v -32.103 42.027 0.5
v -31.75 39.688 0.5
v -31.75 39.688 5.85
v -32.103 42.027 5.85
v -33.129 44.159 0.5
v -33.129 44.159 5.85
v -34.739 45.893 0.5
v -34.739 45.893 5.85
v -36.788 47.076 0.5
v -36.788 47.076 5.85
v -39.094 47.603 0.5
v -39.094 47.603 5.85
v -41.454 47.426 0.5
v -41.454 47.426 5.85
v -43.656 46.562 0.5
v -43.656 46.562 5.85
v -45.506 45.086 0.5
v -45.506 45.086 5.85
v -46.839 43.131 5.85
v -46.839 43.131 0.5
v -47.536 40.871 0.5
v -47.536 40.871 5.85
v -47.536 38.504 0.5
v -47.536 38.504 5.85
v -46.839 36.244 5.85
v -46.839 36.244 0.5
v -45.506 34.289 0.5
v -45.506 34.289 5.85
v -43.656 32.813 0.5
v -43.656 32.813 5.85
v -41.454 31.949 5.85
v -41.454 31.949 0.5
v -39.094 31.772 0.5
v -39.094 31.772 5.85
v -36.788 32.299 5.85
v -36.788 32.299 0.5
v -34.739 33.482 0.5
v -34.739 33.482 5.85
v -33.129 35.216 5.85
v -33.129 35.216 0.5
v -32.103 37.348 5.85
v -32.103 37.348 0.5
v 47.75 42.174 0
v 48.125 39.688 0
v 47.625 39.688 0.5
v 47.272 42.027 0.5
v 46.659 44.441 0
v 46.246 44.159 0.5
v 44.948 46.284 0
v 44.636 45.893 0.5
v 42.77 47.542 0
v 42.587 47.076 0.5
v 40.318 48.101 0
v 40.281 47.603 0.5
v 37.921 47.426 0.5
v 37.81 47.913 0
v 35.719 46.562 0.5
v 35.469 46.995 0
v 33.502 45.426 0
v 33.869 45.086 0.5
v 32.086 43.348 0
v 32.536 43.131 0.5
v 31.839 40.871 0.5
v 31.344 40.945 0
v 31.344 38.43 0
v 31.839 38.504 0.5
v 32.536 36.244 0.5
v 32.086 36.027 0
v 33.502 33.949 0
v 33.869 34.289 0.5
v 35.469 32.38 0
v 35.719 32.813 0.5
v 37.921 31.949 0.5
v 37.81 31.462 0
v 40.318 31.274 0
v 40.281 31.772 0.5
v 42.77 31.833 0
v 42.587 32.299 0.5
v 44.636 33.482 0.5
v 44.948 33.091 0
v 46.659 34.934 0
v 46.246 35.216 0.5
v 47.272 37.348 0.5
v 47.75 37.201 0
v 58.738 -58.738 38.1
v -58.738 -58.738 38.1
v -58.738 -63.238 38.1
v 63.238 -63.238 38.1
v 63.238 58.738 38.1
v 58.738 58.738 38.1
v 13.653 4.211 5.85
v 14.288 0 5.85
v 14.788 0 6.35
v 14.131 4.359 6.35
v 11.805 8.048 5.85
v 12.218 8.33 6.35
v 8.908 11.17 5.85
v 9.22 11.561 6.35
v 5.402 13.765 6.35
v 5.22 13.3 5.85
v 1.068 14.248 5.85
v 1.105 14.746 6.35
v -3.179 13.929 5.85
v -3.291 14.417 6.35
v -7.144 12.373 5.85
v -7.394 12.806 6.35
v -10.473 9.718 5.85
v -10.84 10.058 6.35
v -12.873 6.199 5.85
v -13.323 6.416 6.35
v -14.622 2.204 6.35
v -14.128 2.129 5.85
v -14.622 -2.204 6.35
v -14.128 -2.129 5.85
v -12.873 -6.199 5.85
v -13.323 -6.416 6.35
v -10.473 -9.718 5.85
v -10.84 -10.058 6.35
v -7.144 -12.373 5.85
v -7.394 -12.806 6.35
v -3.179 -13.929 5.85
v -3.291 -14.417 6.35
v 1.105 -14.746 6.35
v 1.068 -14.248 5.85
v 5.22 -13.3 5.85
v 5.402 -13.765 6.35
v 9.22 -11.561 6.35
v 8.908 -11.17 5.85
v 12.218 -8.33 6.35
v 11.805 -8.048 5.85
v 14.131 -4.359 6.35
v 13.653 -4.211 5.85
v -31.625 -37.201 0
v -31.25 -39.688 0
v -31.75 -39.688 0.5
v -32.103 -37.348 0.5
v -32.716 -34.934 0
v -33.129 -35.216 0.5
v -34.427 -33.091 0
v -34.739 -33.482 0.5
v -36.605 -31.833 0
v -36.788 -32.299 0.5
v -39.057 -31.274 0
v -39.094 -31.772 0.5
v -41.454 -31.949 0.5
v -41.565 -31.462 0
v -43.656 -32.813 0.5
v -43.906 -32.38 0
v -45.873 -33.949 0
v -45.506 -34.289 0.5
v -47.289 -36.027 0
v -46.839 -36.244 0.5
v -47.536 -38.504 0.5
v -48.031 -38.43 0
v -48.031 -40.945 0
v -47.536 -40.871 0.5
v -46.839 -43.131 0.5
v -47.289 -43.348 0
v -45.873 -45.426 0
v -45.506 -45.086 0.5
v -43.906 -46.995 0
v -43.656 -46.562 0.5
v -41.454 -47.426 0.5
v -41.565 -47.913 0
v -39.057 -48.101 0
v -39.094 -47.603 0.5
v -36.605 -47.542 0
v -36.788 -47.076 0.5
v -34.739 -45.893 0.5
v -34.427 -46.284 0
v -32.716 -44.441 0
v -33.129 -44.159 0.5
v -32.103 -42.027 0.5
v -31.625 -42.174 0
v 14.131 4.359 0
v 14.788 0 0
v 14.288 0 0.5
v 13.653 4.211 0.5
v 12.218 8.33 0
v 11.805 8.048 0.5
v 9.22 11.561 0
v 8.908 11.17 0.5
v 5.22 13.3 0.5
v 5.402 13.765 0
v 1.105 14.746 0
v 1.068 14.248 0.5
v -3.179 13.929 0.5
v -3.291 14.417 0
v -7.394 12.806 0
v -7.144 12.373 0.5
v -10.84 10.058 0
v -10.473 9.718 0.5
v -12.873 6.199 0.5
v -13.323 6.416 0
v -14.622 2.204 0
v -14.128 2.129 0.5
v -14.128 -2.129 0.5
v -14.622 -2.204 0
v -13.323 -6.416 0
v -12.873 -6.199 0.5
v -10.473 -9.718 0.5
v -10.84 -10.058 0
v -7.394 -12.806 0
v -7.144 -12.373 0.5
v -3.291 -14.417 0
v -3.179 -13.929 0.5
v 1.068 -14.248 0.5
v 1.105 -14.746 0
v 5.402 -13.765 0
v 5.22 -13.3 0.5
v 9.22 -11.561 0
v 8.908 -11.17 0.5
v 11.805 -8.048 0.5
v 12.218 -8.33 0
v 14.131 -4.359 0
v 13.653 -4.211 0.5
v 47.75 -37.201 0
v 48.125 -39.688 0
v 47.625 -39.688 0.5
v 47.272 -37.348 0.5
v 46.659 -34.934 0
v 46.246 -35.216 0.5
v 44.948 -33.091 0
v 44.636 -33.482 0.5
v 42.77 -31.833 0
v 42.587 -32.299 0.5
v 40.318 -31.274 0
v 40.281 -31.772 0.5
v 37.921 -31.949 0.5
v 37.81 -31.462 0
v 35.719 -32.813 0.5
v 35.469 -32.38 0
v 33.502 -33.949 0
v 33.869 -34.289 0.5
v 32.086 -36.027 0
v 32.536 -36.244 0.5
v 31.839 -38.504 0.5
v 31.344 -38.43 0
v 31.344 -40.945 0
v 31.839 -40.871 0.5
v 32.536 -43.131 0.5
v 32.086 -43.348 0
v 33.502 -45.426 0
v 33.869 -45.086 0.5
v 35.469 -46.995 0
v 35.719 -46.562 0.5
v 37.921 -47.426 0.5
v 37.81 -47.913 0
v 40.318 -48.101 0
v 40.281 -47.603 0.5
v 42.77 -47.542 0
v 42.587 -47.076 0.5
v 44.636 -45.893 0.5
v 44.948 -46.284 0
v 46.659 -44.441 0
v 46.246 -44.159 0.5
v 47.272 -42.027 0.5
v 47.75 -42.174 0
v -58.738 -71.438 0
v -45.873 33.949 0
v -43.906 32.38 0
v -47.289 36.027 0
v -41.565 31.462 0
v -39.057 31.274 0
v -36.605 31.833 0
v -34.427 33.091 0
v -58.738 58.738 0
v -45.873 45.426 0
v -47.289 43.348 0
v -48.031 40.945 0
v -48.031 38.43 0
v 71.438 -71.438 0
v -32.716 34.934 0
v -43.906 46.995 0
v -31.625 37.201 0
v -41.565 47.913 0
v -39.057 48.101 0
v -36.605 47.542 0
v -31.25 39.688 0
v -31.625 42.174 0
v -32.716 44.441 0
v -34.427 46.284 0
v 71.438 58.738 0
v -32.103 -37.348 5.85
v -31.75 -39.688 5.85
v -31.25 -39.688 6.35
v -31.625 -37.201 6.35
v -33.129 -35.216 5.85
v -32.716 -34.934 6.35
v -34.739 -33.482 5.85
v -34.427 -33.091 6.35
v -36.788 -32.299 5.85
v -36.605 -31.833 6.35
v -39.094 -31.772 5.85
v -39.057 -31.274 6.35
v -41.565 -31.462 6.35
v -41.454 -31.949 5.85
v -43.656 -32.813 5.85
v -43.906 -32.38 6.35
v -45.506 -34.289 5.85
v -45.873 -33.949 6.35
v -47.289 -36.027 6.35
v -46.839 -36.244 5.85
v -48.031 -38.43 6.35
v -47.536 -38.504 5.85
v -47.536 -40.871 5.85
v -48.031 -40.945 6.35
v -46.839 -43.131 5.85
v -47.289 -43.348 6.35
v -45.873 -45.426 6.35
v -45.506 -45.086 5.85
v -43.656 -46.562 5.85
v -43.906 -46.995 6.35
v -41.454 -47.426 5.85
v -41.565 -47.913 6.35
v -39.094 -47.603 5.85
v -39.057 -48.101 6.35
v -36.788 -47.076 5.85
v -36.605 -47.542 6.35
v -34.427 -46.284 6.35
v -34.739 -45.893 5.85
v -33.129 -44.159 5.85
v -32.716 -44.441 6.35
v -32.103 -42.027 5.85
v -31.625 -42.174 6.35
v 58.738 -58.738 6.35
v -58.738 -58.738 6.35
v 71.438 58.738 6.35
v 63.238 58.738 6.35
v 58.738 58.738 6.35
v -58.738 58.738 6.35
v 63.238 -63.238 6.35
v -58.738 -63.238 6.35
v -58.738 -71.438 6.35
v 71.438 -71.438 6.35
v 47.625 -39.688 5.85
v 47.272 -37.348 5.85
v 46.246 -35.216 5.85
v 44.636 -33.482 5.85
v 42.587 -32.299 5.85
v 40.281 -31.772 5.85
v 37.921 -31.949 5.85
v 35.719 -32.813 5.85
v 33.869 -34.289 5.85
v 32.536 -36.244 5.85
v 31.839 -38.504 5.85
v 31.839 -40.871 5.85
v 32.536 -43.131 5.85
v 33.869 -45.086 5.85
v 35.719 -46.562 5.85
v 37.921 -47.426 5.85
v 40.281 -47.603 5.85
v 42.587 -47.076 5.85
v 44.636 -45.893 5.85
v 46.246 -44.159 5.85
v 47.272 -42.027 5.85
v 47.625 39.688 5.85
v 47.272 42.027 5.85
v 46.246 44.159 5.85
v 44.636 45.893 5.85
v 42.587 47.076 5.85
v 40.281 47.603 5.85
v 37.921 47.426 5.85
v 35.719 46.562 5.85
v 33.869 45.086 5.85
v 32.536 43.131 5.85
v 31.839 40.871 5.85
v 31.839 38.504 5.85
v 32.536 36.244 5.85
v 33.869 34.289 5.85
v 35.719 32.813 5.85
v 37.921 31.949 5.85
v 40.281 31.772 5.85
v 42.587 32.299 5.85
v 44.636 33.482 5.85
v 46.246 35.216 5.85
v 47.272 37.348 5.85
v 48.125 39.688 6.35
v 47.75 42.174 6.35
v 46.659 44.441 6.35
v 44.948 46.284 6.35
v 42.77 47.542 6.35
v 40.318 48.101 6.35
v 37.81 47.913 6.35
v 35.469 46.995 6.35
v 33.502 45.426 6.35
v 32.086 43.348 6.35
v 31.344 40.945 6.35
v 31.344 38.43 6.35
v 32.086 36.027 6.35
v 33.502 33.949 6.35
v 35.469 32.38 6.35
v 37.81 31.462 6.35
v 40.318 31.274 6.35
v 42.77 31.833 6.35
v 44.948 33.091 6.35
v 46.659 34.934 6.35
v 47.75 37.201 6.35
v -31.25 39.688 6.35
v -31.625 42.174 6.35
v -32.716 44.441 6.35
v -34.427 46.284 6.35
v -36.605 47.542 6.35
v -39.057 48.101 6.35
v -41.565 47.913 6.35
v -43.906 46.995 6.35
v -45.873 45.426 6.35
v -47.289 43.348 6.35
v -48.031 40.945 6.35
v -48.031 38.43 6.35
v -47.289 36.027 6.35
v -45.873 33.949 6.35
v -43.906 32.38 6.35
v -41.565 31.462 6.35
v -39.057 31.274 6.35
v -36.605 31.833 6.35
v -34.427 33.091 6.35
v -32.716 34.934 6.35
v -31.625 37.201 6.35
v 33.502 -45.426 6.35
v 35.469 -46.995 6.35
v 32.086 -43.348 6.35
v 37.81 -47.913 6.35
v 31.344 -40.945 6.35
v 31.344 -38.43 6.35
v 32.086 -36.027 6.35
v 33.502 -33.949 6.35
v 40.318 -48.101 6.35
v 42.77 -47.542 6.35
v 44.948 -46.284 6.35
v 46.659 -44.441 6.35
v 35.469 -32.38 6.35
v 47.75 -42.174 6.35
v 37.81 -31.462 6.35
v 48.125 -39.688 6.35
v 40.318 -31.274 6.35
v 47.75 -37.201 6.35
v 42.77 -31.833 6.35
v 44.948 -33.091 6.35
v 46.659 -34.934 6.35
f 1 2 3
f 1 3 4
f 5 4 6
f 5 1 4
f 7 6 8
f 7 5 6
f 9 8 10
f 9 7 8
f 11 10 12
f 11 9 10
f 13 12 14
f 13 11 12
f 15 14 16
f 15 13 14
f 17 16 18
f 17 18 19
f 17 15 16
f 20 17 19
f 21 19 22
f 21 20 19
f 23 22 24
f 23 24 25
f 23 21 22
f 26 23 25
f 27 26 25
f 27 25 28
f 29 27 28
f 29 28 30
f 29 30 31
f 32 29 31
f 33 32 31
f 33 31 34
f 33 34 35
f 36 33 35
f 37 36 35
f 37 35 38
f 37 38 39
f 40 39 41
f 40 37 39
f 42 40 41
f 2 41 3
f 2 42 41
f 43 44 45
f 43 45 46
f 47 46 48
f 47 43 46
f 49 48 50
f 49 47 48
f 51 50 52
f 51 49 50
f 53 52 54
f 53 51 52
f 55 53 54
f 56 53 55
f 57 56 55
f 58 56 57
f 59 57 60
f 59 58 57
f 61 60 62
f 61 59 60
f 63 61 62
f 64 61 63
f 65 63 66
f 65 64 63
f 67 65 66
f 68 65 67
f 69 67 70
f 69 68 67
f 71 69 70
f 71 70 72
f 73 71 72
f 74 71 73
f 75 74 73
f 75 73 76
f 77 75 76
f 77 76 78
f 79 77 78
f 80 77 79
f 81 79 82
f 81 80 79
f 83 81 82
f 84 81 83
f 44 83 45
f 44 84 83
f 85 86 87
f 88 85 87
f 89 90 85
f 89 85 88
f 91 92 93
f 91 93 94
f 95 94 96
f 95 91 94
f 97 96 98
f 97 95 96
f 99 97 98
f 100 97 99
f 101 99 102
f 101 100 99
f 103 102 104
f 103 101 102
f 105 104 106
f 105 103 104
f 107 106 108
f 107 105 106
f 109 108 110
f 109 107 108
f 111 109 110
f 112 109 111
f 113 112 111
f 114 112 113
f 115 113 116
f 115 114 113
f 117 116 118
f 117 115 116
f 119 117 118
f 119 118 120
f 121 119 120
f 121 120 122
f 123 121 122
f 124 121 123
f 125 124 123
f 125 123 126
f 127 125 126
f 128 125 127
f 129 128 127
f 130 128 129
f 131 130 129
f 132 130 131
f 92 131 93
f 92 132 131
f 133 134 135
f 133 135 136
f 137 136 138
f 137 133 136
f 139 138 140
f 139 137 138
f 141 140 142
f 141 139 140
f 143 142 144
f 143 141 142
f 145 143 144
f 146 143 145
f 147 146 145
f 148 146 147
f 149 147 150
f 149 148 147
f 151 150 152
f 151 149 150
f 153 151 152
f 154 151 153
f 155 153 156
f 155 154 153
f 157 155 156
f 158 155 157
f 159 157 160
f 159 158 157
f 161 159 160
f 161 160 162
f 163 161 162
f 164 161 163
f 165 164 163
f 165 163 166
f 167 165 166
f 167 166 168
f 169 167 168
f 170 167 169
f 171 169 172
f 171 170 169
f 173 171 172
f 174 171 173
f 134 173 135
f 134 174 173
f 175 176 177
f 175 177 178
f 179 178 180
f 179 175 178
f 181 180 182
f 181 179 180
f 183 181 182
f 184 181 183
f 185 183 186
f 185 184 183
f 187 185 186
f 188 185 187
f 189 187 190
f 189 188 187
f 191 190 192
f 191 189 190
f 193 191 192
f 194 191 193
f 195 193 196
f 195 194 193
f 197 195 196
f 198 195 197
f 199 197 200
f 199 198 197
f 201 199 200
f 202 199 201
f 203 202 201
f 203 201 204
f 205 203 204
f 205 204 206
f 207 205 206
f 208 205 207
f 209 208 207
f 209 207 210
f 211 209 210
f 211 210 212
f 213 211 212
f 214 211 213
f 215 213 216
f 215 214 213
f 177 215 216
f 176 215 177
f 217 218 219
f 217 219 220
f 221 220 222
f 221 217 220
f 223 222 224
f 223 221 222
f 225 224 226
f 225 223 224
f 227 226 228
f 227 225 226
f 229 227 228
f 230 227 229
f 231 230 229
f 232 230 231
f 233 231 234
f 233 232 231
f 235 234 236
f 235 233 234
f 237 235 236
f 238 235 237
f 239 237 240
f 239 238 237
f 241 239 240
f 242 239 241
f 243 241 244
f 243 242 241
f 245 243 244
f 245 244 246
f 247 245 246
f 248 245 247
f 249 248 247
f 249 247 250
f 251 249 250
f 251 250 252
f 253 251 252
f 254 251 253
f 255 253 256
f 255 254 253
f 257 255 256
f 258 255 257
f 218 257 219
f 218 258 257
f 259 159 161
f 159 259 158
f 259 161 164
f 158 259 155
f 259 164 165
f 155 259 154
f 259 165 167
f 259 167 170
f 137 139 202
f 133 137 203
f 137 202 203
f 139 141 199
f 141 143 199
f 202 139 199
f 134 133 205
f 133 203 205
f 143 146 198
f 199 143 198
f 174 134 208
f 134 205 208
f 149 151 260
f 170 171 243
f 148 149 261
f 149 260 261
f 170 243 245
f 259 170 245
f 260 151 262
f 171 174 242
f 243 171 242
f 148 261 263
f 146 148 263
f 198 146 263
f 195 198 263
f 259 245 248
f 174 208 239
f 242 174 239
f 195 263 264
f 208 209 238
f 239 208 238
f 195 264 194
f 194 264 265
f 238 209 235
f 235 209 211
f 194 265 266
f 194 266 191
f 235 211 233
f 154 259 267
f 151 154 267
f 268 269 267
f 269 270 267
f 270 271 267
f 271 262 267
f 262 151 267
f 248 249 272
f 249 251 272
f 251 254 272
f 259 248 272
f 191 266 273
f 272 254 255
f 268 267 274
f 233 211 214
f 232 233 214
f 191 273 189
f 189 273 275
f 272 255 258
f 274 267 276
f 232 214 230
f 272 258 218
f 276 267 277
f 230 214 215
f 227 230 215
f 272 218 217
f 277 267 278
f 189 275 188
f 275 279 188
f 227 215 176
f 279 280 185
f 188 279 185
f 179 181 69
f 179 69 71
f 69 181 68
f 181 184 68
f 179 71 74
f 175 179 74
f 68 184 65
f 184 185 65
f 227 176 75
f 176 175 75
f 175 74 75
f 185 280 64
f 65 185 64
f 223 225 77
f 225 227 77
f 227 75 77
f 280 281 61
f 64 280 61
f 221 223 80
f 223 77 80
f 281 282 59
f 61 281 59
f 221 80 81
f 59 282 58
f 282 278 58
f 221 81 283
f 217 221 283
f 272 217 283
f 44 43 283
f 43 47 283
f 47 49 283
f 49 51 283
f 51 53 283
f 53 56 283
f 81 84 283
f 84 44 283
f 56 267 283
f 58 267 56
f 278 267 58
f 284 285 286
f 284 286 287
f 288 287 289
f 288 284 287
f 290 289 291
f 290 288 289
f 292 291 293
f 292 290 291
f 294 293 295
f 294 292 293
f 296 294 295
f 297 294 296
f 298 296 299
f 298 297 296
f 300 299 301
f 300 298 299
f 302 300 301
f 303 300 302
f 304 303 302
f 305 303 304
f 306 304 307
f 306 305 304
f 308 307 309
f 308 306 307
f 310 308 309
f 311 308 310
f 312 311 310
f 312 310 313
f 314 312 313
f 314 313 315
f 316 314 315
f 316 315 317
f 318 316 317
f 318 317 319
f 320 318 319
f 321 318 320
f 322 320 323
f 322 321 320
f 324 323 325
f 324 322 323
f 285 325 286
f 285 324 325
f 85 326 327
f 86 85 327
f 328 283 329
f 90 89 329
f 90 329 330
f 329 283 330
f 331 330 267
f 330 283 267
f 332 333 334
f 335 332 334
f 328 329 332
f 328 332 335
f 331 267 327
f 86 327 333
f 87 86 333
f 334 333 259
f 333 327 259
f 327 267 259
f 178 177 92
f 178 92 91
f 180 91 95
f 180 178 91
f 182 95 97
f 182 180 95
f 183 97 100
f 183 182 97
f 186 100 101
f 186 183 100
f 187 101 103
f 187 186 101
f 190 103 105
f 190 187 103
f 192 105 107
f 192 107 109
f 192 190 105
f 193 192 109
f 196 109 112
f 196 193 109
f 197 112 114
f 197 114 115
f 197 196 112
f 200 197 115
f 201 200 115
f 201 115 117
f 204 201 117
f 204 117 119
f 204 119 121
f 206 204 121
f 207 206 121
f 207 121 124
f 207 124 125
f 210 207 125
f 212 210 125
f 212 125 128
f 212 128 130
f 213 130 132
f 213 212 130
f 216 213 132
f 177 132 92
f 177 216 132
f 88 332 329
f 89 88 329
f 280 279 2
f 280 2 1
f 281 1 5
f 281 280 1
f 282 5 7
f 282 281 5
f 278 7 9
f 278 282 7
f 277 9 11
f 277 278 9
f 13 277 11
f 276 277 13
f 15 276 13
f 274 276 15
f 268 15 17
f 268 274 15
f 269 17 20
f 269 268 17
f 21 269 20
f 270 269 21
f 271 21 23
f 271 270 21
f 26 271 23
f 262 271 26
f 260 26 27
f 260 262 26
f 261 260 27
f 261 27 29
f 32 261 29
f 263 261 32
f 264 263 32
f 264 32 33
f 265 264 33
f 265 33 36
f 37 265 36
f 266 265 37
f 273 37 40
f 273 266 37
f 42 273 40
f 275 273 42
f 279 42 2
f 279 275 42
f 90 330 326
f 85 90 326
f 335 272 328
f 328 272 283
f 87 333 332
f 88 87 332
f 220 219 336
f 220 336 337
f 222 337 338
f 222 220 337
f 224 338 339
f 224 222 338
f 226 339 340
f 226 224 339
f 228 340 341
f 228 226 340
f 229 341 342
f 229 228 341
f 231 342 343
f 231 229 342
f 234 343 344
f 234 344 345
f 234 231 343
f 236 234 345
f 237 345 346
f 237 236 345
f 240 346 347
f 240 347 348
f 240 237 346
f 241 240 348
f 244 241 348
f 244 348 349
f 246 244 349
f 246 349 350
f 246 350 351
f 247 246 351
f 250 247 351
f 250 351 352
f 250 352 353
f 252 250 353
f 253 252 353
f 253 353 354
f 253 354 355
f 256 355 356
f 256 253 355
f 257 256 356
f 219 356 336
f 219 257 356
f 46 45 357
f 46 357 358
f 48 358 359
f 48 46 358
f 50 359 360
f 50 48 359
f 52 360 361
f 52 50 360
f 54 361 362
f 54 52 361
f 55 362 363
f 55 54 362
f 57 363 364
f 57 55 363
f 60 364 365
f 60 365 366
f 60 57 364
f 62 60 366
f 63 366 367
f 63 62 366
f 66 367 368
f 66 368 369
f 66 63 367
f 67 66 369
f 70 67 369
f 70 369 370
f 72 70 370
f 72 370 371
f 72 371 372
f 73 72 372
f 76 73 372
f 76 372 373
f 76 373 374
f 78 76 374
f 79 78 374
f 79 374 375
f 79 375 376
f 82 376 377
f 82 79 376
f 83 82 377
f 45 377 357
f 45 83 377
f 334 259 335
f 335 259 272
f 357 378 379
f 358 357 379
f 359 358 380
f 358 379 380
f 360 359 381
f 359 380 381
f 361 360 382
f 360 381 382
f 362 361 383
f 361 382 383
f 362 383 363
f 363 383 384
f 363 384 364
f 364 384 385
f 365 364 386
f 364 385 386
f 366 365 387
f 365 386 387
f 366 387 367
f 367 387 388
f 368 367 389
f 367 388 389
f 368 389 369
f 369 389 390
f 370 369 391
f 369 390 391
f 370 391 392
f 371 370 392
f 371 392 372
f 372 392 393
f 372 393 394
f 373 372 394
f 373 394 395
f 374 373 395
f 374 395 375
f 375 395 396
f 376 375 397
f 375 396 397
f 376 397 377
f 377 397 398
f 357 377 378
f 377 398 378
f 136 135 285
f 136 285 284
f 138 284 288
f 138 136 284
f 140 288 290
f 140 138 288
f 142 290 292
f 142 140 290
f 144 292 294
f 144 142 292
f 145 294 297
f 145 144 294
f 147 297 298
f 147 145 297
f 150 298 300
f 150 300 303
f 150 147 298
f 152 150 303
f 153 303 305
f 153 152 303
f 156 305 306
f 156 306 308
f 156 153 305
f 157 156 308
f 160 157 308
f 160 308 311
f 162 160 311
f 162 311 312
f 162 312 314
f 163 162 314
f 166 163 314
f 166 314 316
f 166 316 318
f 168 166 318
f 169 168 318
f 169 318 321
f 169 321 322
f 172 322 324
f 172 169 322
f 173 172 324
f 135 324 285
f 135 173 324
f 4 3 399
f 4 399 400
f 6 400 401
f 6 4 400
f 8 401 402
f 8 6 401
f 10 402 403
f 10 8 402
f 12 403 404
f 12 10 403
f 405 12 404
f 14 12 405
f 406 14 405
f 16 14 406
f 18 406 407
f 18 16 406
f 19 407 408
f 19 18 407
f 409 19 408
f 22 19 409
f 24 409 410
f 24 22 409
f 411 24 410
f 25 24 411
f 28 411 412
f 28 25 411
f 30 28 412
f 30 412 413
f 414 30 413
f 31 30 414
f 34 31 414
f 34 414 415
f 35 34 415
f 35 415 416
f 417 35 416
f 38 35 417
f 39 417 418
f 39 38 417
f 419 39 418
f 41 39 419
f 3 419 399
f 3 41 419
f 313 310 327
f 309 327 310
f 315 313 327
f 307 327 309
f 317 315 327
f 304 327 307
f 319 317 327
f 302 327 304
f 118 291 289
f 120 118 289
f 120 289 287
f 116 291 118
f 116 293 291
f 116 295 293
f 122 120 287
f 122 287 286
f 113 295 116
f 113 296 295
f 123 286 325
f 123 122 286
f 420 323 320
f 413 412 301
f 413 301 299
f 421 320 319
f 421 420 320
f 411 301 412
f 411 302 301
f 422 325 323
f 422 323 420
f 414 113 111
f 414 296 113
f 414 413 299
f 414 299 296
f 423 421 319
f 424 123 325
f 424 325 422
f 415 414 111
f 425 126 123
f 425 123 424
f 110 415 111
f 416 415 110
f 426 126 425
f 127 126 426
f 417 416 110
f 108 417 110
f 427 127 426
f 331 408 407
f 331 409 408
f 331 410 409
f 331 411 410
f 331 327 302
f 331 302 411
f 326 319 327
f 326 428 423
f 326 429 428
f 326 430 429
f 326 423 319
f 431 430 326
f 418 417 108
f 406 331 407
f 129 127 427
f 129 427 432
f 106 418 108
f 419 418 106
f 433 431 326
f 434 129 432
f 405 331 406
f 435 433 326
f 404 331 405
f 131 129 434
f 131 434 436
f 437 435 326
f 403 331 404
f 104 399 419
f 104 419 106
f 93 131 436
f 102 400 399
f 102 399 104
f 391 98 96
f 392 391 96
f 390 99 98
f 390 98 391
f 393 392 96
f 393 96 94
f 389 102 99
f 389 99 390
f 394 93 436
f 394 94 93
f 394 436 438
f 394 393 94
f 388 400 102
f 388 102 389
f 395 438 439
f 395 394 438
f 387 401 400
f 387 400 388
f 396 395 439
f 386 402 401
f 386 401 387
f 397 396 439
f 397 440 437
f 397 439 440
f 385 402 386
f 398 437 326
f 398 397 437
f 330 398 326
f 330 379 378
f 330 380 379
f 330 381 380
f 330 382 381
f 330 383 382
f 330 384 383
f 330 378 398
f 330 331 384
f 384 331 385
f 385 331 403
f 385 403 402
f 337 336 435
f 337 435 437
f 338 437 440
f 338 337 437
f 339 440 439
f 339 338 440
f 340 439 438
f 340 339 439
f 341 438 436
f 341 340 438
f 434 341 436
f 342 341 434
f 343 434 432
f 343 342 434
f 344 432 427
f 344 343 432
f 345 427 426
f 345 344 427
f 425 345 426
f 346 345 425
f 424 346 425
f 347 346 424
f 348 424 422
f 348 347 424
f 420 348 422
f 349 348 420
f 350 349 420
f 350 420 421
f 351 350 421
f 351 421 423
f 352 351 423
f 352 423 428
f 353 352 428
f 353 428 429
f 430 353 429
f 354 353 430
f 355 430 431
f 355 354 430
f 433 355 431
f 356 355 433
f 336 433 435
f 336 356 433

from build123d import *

# Parameters (mm, degrees)
F0_W     = 117.475
F0_H     = 117.475
F0_R     = 7.9375
F0_R_2   = 14.2875
F1_DEPTH = 6.35
F2_DEPTH = 38.1
F3_SIZE  = 0.5
F4_SIZE  = 0.5


with BuildPart() as f1:
    # F0 (on Top) → F1 (new body)
    with BuildSketch(Plane.XY):
        Rectangle(F0_W, F0_H)
        with Locations((-39.6875, -39.6875)):
            Circle(F0_R, mode=Mode.SUBTRACT)
        with Locations((39.6875, -39.6875)):
            Circle(F0_R, mode=Mode.SUBTRACT)
        Circle(F0_R_2, mode=Mode.SUBTRACT)
        with Locations((-39.6875, 39.6875)):
            Circle(F0_R, mode=Mode.SUBTRACT)
        with Locations((39.6875, 39.6875)):
            Circle(F0_R, mode=Mode.SUBTRACT)
        Polygon((63.2375, 58.7375), (58.7375, 58.7375), (58.7375, -58.7375), (-58.7375, -58.7375), (-58.7375, -63.2375), (63.2375, -63.2375), align=None)
        Polygon((71.4375, 58.7375), (63.2375, 58.7375), (63.2375, -63.2375), (-58.7375, -63.2375), (-58.7375, -71.4375), (71.4375, -71.4375), align=None)
    extrude(amount=F1_DEPTH)

    # F0 (on Top) → F2 (join)
    with BuildSketch(Plane.XY):
        Polygon((63.2375, 58.7375), (58.7375, 58.7375), (58.7375, -58.7375), (-58.7375, -58.7375), (-58.7375, -63.2375), (63.2375, -63.2375), align=None)
    extrude(amount=F2_DEPTH)

    # F3
    f3_edges = [f1.edges().sort_by_distance(p)[0] for p in [
        (31.75, -39.6875, 0),
        (-47.625, -39.6875, 0),
        (-47.625, 39.6875, 0),
        (31.75, 39.6875, 0),
        (-14.2875, 0, 0),
    ]]
    chamfer(f3_edges, length=F3_SIZE)

    # F4
    f4_edges = [f1.edges().sort_by_distance(p)[0] for p in [
        (-47.625, 39.6875, 6.35),
        (31.75, 39.6875, 6.35),
        (-14.2875, 0, 6.35),
        (31.75, -39.6875, 6.35),
        (-47.625, -39.6875, 6.35),
    ]]
    chamfer(f4_edges, length=F4_SIZE)


solid = f1.part
